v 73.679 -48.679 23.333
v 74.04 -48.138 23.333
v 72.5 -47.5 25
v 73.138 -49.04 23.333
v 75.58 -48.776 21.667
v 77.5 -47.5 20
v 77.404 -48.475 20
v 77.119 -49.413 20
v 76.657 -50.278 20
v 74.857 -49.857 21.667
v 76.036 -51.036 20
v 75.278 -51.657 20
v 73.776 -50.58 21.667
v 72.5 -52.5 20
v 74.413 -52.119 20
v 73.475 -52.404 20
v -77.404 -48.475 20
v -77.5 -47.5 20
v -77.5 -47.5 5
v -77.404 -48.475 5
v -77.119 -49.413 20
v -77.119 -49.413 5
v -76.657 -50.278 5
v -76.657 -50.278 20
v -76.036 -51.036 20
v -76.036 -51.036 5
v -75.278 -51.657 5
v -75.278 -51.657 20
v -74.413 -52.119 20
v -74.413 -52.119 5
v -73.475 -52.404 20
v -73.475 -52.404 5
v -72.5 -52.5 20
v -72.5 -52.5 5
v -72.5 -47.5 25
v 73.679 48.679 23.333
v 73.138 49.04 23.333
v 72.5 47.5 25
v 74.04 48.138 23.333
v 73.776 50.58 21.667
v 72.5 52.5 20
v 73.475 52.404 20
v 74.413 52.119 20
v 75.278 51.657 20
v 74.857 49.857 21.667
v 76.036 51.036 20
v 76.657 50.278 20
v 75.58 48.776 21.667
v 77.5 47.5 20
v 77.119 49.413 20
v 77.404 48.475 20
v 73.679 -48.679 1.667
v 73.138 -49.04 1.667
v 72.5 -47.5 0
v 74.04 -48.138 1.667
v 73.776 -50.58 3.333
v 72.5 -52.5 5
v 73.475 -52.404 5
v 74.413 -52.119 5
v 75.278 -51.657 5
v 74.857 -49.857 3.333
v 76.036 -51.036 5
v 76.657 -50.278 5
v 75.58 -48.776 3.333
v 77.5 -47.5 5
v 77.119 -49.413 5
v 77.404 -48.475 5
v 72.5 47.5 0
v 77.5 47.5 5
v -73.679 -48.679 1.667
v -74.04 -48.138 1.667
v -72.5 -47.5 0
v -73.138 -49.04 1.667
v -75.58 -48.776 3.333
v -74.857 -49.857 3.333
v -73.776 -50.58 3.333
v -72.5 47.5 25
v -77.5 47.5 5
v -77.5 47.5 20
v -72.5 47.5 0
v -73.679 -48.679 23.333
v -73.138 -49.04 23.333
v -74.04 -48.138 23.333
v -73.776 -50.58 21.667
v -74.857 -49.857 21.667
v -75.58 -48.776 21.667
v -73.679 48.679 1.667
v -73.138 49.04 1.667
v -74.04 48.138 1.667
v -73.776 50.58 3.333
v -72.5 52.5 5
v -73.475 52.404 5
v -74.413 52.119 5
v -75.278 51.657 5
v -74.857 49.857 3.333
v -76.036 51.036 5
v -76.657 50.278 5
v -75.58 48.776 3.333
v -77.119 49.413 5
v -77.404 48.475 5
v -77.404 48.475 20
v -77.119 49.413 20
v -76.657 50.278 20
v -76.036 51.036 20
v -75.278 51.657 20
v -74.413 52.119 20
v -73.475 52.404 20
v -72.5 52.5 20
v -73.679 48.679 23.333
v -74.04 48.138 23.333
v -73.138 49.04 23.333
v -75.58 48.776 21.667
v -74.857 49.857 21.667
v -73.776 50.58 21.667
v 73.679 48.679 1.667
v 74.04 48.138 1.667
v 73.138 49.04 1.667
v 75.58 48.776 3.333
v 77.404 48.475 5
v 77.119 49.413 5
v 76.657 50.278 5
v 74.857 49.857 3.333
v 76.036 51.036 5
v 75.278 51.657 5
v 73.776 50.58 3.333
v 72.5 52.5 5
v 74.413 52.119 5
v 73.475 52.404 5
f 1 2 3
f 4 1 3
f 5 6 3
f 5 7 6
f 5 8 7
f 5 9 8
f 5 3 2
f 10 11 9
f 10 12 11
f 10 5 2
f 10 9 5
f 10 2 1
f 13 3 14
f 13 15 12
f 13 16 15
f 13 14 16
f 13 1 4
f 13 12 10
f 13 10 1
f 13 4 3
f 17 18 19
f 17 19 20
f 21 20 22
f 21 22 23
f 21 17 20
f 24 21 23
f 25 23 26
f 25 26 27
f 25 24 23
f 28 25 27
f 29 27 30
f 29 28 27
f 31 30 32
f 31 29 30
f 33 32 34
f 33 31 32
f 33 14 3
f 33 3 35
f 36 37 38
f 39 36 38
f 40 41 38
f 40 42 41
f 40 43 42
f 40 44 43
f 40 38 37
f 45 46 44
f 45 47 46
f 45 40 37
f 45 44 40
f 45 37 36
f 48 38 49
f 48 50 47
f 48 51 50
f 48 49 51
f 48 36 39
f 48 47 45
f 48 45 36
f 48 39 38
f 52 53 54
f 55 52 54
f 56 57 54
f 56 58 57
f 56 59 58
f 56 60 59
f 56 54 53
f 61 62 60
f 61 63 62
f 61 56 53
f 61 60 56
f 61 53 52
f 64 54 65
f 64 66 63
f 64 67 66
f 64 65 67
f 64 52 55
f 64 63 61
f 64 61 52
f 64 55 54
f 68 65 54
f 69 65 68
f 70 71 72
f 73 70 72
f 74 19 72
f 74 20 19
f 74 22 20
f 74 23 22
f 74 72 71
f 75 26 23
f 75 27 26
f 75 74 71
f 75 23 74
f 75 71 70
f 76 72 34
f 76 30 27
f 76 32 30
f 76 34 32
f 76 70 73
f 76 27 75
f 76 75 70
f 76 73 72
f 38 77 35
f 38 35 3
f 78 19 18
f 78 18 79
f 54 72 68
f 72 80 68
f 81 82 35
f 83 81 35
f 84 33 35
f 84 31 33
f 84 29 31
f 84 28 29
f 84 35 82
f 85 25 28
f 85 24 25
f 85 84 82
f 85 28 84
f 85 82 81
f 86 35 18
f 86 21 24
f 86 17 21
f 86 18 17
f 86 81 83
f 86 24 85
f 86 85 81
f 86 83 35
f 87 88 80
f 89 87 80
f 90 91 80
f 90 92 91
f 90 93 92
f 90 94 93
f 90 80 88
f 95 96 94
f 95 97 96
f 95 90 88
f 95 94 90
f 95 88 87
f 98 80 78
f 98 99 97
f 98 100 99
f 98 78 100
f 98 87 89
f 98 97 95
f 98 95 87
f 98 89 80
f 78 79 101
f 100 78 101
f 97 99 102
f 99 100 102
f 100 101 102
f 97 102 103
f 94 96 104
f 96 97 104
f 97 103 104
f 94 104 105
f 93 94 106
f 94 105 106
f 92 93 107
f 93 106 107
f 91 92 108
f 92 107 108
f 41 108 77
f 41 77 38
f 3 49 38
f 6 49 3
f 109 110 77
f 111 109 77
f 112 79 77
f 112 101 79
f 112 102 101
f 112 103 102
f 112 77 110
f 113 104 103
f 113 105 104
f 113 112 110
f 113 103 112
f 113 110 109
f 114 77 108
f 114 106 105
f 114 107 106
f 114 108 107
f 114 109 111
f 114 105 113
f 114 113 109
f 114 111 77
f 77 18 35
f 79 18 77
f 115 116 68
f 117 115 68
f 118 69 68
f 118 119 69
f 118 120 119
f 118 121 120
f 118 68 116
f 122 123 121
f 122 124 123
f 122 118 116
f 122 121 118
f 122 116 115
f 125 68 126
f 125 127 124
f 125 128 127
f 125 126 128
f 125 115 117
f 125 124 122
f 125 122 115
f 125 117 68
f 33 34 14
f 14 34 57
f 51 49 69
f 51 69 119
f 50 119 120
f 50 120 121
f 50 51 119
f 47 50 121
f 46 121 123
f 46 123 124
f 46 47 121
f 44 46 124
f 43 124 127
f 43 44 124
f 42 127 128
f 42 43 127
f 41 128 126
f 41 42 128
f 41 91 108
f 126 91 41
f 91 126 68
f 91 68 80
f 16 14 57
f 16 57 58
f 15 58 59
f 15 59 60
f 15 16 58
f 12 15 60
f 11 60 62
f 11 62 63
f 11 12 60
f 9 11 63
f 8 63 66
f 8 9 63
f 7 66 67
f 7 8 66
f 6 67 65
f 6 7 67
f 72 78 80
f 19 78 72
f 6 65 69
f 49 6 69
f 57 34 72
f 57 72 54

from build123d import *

# Parameters (mm, degrees)
F0_W     = 155
F0_H     = 105
F1_DEPTH = 25
F2_R     = 5
F3_SIZE  = 5


with BuildPart() as f1:
    # F0 (on Top) → F1 (new body)
    with BuildSketch(Plane.XY):
        Rectangle(F0_W, F0_H)
    extrude(amount=F1_DEPTH)

    # F2
    f2_edges = [f1.edges().sort_by_distance(p)[0] for p in [
        (-77.5, -52.5, 12.5),
        (-77.5, 52.5, 12.5),
        (77.5, -52.5, 12.5),
        (77.5, 52.5, 12.5),
    ]]
    fillet(f2_edges, radius=F2_R)

    # F3
    f3_edges = [f1.edges().sort_by_distance(p)[0] for p in [
        (0, 52.5, 25),
        (0, -52.5, 0),
    ]]
    chamfer(f3_edges, length=F3_SIZE)


solid = f1.part
